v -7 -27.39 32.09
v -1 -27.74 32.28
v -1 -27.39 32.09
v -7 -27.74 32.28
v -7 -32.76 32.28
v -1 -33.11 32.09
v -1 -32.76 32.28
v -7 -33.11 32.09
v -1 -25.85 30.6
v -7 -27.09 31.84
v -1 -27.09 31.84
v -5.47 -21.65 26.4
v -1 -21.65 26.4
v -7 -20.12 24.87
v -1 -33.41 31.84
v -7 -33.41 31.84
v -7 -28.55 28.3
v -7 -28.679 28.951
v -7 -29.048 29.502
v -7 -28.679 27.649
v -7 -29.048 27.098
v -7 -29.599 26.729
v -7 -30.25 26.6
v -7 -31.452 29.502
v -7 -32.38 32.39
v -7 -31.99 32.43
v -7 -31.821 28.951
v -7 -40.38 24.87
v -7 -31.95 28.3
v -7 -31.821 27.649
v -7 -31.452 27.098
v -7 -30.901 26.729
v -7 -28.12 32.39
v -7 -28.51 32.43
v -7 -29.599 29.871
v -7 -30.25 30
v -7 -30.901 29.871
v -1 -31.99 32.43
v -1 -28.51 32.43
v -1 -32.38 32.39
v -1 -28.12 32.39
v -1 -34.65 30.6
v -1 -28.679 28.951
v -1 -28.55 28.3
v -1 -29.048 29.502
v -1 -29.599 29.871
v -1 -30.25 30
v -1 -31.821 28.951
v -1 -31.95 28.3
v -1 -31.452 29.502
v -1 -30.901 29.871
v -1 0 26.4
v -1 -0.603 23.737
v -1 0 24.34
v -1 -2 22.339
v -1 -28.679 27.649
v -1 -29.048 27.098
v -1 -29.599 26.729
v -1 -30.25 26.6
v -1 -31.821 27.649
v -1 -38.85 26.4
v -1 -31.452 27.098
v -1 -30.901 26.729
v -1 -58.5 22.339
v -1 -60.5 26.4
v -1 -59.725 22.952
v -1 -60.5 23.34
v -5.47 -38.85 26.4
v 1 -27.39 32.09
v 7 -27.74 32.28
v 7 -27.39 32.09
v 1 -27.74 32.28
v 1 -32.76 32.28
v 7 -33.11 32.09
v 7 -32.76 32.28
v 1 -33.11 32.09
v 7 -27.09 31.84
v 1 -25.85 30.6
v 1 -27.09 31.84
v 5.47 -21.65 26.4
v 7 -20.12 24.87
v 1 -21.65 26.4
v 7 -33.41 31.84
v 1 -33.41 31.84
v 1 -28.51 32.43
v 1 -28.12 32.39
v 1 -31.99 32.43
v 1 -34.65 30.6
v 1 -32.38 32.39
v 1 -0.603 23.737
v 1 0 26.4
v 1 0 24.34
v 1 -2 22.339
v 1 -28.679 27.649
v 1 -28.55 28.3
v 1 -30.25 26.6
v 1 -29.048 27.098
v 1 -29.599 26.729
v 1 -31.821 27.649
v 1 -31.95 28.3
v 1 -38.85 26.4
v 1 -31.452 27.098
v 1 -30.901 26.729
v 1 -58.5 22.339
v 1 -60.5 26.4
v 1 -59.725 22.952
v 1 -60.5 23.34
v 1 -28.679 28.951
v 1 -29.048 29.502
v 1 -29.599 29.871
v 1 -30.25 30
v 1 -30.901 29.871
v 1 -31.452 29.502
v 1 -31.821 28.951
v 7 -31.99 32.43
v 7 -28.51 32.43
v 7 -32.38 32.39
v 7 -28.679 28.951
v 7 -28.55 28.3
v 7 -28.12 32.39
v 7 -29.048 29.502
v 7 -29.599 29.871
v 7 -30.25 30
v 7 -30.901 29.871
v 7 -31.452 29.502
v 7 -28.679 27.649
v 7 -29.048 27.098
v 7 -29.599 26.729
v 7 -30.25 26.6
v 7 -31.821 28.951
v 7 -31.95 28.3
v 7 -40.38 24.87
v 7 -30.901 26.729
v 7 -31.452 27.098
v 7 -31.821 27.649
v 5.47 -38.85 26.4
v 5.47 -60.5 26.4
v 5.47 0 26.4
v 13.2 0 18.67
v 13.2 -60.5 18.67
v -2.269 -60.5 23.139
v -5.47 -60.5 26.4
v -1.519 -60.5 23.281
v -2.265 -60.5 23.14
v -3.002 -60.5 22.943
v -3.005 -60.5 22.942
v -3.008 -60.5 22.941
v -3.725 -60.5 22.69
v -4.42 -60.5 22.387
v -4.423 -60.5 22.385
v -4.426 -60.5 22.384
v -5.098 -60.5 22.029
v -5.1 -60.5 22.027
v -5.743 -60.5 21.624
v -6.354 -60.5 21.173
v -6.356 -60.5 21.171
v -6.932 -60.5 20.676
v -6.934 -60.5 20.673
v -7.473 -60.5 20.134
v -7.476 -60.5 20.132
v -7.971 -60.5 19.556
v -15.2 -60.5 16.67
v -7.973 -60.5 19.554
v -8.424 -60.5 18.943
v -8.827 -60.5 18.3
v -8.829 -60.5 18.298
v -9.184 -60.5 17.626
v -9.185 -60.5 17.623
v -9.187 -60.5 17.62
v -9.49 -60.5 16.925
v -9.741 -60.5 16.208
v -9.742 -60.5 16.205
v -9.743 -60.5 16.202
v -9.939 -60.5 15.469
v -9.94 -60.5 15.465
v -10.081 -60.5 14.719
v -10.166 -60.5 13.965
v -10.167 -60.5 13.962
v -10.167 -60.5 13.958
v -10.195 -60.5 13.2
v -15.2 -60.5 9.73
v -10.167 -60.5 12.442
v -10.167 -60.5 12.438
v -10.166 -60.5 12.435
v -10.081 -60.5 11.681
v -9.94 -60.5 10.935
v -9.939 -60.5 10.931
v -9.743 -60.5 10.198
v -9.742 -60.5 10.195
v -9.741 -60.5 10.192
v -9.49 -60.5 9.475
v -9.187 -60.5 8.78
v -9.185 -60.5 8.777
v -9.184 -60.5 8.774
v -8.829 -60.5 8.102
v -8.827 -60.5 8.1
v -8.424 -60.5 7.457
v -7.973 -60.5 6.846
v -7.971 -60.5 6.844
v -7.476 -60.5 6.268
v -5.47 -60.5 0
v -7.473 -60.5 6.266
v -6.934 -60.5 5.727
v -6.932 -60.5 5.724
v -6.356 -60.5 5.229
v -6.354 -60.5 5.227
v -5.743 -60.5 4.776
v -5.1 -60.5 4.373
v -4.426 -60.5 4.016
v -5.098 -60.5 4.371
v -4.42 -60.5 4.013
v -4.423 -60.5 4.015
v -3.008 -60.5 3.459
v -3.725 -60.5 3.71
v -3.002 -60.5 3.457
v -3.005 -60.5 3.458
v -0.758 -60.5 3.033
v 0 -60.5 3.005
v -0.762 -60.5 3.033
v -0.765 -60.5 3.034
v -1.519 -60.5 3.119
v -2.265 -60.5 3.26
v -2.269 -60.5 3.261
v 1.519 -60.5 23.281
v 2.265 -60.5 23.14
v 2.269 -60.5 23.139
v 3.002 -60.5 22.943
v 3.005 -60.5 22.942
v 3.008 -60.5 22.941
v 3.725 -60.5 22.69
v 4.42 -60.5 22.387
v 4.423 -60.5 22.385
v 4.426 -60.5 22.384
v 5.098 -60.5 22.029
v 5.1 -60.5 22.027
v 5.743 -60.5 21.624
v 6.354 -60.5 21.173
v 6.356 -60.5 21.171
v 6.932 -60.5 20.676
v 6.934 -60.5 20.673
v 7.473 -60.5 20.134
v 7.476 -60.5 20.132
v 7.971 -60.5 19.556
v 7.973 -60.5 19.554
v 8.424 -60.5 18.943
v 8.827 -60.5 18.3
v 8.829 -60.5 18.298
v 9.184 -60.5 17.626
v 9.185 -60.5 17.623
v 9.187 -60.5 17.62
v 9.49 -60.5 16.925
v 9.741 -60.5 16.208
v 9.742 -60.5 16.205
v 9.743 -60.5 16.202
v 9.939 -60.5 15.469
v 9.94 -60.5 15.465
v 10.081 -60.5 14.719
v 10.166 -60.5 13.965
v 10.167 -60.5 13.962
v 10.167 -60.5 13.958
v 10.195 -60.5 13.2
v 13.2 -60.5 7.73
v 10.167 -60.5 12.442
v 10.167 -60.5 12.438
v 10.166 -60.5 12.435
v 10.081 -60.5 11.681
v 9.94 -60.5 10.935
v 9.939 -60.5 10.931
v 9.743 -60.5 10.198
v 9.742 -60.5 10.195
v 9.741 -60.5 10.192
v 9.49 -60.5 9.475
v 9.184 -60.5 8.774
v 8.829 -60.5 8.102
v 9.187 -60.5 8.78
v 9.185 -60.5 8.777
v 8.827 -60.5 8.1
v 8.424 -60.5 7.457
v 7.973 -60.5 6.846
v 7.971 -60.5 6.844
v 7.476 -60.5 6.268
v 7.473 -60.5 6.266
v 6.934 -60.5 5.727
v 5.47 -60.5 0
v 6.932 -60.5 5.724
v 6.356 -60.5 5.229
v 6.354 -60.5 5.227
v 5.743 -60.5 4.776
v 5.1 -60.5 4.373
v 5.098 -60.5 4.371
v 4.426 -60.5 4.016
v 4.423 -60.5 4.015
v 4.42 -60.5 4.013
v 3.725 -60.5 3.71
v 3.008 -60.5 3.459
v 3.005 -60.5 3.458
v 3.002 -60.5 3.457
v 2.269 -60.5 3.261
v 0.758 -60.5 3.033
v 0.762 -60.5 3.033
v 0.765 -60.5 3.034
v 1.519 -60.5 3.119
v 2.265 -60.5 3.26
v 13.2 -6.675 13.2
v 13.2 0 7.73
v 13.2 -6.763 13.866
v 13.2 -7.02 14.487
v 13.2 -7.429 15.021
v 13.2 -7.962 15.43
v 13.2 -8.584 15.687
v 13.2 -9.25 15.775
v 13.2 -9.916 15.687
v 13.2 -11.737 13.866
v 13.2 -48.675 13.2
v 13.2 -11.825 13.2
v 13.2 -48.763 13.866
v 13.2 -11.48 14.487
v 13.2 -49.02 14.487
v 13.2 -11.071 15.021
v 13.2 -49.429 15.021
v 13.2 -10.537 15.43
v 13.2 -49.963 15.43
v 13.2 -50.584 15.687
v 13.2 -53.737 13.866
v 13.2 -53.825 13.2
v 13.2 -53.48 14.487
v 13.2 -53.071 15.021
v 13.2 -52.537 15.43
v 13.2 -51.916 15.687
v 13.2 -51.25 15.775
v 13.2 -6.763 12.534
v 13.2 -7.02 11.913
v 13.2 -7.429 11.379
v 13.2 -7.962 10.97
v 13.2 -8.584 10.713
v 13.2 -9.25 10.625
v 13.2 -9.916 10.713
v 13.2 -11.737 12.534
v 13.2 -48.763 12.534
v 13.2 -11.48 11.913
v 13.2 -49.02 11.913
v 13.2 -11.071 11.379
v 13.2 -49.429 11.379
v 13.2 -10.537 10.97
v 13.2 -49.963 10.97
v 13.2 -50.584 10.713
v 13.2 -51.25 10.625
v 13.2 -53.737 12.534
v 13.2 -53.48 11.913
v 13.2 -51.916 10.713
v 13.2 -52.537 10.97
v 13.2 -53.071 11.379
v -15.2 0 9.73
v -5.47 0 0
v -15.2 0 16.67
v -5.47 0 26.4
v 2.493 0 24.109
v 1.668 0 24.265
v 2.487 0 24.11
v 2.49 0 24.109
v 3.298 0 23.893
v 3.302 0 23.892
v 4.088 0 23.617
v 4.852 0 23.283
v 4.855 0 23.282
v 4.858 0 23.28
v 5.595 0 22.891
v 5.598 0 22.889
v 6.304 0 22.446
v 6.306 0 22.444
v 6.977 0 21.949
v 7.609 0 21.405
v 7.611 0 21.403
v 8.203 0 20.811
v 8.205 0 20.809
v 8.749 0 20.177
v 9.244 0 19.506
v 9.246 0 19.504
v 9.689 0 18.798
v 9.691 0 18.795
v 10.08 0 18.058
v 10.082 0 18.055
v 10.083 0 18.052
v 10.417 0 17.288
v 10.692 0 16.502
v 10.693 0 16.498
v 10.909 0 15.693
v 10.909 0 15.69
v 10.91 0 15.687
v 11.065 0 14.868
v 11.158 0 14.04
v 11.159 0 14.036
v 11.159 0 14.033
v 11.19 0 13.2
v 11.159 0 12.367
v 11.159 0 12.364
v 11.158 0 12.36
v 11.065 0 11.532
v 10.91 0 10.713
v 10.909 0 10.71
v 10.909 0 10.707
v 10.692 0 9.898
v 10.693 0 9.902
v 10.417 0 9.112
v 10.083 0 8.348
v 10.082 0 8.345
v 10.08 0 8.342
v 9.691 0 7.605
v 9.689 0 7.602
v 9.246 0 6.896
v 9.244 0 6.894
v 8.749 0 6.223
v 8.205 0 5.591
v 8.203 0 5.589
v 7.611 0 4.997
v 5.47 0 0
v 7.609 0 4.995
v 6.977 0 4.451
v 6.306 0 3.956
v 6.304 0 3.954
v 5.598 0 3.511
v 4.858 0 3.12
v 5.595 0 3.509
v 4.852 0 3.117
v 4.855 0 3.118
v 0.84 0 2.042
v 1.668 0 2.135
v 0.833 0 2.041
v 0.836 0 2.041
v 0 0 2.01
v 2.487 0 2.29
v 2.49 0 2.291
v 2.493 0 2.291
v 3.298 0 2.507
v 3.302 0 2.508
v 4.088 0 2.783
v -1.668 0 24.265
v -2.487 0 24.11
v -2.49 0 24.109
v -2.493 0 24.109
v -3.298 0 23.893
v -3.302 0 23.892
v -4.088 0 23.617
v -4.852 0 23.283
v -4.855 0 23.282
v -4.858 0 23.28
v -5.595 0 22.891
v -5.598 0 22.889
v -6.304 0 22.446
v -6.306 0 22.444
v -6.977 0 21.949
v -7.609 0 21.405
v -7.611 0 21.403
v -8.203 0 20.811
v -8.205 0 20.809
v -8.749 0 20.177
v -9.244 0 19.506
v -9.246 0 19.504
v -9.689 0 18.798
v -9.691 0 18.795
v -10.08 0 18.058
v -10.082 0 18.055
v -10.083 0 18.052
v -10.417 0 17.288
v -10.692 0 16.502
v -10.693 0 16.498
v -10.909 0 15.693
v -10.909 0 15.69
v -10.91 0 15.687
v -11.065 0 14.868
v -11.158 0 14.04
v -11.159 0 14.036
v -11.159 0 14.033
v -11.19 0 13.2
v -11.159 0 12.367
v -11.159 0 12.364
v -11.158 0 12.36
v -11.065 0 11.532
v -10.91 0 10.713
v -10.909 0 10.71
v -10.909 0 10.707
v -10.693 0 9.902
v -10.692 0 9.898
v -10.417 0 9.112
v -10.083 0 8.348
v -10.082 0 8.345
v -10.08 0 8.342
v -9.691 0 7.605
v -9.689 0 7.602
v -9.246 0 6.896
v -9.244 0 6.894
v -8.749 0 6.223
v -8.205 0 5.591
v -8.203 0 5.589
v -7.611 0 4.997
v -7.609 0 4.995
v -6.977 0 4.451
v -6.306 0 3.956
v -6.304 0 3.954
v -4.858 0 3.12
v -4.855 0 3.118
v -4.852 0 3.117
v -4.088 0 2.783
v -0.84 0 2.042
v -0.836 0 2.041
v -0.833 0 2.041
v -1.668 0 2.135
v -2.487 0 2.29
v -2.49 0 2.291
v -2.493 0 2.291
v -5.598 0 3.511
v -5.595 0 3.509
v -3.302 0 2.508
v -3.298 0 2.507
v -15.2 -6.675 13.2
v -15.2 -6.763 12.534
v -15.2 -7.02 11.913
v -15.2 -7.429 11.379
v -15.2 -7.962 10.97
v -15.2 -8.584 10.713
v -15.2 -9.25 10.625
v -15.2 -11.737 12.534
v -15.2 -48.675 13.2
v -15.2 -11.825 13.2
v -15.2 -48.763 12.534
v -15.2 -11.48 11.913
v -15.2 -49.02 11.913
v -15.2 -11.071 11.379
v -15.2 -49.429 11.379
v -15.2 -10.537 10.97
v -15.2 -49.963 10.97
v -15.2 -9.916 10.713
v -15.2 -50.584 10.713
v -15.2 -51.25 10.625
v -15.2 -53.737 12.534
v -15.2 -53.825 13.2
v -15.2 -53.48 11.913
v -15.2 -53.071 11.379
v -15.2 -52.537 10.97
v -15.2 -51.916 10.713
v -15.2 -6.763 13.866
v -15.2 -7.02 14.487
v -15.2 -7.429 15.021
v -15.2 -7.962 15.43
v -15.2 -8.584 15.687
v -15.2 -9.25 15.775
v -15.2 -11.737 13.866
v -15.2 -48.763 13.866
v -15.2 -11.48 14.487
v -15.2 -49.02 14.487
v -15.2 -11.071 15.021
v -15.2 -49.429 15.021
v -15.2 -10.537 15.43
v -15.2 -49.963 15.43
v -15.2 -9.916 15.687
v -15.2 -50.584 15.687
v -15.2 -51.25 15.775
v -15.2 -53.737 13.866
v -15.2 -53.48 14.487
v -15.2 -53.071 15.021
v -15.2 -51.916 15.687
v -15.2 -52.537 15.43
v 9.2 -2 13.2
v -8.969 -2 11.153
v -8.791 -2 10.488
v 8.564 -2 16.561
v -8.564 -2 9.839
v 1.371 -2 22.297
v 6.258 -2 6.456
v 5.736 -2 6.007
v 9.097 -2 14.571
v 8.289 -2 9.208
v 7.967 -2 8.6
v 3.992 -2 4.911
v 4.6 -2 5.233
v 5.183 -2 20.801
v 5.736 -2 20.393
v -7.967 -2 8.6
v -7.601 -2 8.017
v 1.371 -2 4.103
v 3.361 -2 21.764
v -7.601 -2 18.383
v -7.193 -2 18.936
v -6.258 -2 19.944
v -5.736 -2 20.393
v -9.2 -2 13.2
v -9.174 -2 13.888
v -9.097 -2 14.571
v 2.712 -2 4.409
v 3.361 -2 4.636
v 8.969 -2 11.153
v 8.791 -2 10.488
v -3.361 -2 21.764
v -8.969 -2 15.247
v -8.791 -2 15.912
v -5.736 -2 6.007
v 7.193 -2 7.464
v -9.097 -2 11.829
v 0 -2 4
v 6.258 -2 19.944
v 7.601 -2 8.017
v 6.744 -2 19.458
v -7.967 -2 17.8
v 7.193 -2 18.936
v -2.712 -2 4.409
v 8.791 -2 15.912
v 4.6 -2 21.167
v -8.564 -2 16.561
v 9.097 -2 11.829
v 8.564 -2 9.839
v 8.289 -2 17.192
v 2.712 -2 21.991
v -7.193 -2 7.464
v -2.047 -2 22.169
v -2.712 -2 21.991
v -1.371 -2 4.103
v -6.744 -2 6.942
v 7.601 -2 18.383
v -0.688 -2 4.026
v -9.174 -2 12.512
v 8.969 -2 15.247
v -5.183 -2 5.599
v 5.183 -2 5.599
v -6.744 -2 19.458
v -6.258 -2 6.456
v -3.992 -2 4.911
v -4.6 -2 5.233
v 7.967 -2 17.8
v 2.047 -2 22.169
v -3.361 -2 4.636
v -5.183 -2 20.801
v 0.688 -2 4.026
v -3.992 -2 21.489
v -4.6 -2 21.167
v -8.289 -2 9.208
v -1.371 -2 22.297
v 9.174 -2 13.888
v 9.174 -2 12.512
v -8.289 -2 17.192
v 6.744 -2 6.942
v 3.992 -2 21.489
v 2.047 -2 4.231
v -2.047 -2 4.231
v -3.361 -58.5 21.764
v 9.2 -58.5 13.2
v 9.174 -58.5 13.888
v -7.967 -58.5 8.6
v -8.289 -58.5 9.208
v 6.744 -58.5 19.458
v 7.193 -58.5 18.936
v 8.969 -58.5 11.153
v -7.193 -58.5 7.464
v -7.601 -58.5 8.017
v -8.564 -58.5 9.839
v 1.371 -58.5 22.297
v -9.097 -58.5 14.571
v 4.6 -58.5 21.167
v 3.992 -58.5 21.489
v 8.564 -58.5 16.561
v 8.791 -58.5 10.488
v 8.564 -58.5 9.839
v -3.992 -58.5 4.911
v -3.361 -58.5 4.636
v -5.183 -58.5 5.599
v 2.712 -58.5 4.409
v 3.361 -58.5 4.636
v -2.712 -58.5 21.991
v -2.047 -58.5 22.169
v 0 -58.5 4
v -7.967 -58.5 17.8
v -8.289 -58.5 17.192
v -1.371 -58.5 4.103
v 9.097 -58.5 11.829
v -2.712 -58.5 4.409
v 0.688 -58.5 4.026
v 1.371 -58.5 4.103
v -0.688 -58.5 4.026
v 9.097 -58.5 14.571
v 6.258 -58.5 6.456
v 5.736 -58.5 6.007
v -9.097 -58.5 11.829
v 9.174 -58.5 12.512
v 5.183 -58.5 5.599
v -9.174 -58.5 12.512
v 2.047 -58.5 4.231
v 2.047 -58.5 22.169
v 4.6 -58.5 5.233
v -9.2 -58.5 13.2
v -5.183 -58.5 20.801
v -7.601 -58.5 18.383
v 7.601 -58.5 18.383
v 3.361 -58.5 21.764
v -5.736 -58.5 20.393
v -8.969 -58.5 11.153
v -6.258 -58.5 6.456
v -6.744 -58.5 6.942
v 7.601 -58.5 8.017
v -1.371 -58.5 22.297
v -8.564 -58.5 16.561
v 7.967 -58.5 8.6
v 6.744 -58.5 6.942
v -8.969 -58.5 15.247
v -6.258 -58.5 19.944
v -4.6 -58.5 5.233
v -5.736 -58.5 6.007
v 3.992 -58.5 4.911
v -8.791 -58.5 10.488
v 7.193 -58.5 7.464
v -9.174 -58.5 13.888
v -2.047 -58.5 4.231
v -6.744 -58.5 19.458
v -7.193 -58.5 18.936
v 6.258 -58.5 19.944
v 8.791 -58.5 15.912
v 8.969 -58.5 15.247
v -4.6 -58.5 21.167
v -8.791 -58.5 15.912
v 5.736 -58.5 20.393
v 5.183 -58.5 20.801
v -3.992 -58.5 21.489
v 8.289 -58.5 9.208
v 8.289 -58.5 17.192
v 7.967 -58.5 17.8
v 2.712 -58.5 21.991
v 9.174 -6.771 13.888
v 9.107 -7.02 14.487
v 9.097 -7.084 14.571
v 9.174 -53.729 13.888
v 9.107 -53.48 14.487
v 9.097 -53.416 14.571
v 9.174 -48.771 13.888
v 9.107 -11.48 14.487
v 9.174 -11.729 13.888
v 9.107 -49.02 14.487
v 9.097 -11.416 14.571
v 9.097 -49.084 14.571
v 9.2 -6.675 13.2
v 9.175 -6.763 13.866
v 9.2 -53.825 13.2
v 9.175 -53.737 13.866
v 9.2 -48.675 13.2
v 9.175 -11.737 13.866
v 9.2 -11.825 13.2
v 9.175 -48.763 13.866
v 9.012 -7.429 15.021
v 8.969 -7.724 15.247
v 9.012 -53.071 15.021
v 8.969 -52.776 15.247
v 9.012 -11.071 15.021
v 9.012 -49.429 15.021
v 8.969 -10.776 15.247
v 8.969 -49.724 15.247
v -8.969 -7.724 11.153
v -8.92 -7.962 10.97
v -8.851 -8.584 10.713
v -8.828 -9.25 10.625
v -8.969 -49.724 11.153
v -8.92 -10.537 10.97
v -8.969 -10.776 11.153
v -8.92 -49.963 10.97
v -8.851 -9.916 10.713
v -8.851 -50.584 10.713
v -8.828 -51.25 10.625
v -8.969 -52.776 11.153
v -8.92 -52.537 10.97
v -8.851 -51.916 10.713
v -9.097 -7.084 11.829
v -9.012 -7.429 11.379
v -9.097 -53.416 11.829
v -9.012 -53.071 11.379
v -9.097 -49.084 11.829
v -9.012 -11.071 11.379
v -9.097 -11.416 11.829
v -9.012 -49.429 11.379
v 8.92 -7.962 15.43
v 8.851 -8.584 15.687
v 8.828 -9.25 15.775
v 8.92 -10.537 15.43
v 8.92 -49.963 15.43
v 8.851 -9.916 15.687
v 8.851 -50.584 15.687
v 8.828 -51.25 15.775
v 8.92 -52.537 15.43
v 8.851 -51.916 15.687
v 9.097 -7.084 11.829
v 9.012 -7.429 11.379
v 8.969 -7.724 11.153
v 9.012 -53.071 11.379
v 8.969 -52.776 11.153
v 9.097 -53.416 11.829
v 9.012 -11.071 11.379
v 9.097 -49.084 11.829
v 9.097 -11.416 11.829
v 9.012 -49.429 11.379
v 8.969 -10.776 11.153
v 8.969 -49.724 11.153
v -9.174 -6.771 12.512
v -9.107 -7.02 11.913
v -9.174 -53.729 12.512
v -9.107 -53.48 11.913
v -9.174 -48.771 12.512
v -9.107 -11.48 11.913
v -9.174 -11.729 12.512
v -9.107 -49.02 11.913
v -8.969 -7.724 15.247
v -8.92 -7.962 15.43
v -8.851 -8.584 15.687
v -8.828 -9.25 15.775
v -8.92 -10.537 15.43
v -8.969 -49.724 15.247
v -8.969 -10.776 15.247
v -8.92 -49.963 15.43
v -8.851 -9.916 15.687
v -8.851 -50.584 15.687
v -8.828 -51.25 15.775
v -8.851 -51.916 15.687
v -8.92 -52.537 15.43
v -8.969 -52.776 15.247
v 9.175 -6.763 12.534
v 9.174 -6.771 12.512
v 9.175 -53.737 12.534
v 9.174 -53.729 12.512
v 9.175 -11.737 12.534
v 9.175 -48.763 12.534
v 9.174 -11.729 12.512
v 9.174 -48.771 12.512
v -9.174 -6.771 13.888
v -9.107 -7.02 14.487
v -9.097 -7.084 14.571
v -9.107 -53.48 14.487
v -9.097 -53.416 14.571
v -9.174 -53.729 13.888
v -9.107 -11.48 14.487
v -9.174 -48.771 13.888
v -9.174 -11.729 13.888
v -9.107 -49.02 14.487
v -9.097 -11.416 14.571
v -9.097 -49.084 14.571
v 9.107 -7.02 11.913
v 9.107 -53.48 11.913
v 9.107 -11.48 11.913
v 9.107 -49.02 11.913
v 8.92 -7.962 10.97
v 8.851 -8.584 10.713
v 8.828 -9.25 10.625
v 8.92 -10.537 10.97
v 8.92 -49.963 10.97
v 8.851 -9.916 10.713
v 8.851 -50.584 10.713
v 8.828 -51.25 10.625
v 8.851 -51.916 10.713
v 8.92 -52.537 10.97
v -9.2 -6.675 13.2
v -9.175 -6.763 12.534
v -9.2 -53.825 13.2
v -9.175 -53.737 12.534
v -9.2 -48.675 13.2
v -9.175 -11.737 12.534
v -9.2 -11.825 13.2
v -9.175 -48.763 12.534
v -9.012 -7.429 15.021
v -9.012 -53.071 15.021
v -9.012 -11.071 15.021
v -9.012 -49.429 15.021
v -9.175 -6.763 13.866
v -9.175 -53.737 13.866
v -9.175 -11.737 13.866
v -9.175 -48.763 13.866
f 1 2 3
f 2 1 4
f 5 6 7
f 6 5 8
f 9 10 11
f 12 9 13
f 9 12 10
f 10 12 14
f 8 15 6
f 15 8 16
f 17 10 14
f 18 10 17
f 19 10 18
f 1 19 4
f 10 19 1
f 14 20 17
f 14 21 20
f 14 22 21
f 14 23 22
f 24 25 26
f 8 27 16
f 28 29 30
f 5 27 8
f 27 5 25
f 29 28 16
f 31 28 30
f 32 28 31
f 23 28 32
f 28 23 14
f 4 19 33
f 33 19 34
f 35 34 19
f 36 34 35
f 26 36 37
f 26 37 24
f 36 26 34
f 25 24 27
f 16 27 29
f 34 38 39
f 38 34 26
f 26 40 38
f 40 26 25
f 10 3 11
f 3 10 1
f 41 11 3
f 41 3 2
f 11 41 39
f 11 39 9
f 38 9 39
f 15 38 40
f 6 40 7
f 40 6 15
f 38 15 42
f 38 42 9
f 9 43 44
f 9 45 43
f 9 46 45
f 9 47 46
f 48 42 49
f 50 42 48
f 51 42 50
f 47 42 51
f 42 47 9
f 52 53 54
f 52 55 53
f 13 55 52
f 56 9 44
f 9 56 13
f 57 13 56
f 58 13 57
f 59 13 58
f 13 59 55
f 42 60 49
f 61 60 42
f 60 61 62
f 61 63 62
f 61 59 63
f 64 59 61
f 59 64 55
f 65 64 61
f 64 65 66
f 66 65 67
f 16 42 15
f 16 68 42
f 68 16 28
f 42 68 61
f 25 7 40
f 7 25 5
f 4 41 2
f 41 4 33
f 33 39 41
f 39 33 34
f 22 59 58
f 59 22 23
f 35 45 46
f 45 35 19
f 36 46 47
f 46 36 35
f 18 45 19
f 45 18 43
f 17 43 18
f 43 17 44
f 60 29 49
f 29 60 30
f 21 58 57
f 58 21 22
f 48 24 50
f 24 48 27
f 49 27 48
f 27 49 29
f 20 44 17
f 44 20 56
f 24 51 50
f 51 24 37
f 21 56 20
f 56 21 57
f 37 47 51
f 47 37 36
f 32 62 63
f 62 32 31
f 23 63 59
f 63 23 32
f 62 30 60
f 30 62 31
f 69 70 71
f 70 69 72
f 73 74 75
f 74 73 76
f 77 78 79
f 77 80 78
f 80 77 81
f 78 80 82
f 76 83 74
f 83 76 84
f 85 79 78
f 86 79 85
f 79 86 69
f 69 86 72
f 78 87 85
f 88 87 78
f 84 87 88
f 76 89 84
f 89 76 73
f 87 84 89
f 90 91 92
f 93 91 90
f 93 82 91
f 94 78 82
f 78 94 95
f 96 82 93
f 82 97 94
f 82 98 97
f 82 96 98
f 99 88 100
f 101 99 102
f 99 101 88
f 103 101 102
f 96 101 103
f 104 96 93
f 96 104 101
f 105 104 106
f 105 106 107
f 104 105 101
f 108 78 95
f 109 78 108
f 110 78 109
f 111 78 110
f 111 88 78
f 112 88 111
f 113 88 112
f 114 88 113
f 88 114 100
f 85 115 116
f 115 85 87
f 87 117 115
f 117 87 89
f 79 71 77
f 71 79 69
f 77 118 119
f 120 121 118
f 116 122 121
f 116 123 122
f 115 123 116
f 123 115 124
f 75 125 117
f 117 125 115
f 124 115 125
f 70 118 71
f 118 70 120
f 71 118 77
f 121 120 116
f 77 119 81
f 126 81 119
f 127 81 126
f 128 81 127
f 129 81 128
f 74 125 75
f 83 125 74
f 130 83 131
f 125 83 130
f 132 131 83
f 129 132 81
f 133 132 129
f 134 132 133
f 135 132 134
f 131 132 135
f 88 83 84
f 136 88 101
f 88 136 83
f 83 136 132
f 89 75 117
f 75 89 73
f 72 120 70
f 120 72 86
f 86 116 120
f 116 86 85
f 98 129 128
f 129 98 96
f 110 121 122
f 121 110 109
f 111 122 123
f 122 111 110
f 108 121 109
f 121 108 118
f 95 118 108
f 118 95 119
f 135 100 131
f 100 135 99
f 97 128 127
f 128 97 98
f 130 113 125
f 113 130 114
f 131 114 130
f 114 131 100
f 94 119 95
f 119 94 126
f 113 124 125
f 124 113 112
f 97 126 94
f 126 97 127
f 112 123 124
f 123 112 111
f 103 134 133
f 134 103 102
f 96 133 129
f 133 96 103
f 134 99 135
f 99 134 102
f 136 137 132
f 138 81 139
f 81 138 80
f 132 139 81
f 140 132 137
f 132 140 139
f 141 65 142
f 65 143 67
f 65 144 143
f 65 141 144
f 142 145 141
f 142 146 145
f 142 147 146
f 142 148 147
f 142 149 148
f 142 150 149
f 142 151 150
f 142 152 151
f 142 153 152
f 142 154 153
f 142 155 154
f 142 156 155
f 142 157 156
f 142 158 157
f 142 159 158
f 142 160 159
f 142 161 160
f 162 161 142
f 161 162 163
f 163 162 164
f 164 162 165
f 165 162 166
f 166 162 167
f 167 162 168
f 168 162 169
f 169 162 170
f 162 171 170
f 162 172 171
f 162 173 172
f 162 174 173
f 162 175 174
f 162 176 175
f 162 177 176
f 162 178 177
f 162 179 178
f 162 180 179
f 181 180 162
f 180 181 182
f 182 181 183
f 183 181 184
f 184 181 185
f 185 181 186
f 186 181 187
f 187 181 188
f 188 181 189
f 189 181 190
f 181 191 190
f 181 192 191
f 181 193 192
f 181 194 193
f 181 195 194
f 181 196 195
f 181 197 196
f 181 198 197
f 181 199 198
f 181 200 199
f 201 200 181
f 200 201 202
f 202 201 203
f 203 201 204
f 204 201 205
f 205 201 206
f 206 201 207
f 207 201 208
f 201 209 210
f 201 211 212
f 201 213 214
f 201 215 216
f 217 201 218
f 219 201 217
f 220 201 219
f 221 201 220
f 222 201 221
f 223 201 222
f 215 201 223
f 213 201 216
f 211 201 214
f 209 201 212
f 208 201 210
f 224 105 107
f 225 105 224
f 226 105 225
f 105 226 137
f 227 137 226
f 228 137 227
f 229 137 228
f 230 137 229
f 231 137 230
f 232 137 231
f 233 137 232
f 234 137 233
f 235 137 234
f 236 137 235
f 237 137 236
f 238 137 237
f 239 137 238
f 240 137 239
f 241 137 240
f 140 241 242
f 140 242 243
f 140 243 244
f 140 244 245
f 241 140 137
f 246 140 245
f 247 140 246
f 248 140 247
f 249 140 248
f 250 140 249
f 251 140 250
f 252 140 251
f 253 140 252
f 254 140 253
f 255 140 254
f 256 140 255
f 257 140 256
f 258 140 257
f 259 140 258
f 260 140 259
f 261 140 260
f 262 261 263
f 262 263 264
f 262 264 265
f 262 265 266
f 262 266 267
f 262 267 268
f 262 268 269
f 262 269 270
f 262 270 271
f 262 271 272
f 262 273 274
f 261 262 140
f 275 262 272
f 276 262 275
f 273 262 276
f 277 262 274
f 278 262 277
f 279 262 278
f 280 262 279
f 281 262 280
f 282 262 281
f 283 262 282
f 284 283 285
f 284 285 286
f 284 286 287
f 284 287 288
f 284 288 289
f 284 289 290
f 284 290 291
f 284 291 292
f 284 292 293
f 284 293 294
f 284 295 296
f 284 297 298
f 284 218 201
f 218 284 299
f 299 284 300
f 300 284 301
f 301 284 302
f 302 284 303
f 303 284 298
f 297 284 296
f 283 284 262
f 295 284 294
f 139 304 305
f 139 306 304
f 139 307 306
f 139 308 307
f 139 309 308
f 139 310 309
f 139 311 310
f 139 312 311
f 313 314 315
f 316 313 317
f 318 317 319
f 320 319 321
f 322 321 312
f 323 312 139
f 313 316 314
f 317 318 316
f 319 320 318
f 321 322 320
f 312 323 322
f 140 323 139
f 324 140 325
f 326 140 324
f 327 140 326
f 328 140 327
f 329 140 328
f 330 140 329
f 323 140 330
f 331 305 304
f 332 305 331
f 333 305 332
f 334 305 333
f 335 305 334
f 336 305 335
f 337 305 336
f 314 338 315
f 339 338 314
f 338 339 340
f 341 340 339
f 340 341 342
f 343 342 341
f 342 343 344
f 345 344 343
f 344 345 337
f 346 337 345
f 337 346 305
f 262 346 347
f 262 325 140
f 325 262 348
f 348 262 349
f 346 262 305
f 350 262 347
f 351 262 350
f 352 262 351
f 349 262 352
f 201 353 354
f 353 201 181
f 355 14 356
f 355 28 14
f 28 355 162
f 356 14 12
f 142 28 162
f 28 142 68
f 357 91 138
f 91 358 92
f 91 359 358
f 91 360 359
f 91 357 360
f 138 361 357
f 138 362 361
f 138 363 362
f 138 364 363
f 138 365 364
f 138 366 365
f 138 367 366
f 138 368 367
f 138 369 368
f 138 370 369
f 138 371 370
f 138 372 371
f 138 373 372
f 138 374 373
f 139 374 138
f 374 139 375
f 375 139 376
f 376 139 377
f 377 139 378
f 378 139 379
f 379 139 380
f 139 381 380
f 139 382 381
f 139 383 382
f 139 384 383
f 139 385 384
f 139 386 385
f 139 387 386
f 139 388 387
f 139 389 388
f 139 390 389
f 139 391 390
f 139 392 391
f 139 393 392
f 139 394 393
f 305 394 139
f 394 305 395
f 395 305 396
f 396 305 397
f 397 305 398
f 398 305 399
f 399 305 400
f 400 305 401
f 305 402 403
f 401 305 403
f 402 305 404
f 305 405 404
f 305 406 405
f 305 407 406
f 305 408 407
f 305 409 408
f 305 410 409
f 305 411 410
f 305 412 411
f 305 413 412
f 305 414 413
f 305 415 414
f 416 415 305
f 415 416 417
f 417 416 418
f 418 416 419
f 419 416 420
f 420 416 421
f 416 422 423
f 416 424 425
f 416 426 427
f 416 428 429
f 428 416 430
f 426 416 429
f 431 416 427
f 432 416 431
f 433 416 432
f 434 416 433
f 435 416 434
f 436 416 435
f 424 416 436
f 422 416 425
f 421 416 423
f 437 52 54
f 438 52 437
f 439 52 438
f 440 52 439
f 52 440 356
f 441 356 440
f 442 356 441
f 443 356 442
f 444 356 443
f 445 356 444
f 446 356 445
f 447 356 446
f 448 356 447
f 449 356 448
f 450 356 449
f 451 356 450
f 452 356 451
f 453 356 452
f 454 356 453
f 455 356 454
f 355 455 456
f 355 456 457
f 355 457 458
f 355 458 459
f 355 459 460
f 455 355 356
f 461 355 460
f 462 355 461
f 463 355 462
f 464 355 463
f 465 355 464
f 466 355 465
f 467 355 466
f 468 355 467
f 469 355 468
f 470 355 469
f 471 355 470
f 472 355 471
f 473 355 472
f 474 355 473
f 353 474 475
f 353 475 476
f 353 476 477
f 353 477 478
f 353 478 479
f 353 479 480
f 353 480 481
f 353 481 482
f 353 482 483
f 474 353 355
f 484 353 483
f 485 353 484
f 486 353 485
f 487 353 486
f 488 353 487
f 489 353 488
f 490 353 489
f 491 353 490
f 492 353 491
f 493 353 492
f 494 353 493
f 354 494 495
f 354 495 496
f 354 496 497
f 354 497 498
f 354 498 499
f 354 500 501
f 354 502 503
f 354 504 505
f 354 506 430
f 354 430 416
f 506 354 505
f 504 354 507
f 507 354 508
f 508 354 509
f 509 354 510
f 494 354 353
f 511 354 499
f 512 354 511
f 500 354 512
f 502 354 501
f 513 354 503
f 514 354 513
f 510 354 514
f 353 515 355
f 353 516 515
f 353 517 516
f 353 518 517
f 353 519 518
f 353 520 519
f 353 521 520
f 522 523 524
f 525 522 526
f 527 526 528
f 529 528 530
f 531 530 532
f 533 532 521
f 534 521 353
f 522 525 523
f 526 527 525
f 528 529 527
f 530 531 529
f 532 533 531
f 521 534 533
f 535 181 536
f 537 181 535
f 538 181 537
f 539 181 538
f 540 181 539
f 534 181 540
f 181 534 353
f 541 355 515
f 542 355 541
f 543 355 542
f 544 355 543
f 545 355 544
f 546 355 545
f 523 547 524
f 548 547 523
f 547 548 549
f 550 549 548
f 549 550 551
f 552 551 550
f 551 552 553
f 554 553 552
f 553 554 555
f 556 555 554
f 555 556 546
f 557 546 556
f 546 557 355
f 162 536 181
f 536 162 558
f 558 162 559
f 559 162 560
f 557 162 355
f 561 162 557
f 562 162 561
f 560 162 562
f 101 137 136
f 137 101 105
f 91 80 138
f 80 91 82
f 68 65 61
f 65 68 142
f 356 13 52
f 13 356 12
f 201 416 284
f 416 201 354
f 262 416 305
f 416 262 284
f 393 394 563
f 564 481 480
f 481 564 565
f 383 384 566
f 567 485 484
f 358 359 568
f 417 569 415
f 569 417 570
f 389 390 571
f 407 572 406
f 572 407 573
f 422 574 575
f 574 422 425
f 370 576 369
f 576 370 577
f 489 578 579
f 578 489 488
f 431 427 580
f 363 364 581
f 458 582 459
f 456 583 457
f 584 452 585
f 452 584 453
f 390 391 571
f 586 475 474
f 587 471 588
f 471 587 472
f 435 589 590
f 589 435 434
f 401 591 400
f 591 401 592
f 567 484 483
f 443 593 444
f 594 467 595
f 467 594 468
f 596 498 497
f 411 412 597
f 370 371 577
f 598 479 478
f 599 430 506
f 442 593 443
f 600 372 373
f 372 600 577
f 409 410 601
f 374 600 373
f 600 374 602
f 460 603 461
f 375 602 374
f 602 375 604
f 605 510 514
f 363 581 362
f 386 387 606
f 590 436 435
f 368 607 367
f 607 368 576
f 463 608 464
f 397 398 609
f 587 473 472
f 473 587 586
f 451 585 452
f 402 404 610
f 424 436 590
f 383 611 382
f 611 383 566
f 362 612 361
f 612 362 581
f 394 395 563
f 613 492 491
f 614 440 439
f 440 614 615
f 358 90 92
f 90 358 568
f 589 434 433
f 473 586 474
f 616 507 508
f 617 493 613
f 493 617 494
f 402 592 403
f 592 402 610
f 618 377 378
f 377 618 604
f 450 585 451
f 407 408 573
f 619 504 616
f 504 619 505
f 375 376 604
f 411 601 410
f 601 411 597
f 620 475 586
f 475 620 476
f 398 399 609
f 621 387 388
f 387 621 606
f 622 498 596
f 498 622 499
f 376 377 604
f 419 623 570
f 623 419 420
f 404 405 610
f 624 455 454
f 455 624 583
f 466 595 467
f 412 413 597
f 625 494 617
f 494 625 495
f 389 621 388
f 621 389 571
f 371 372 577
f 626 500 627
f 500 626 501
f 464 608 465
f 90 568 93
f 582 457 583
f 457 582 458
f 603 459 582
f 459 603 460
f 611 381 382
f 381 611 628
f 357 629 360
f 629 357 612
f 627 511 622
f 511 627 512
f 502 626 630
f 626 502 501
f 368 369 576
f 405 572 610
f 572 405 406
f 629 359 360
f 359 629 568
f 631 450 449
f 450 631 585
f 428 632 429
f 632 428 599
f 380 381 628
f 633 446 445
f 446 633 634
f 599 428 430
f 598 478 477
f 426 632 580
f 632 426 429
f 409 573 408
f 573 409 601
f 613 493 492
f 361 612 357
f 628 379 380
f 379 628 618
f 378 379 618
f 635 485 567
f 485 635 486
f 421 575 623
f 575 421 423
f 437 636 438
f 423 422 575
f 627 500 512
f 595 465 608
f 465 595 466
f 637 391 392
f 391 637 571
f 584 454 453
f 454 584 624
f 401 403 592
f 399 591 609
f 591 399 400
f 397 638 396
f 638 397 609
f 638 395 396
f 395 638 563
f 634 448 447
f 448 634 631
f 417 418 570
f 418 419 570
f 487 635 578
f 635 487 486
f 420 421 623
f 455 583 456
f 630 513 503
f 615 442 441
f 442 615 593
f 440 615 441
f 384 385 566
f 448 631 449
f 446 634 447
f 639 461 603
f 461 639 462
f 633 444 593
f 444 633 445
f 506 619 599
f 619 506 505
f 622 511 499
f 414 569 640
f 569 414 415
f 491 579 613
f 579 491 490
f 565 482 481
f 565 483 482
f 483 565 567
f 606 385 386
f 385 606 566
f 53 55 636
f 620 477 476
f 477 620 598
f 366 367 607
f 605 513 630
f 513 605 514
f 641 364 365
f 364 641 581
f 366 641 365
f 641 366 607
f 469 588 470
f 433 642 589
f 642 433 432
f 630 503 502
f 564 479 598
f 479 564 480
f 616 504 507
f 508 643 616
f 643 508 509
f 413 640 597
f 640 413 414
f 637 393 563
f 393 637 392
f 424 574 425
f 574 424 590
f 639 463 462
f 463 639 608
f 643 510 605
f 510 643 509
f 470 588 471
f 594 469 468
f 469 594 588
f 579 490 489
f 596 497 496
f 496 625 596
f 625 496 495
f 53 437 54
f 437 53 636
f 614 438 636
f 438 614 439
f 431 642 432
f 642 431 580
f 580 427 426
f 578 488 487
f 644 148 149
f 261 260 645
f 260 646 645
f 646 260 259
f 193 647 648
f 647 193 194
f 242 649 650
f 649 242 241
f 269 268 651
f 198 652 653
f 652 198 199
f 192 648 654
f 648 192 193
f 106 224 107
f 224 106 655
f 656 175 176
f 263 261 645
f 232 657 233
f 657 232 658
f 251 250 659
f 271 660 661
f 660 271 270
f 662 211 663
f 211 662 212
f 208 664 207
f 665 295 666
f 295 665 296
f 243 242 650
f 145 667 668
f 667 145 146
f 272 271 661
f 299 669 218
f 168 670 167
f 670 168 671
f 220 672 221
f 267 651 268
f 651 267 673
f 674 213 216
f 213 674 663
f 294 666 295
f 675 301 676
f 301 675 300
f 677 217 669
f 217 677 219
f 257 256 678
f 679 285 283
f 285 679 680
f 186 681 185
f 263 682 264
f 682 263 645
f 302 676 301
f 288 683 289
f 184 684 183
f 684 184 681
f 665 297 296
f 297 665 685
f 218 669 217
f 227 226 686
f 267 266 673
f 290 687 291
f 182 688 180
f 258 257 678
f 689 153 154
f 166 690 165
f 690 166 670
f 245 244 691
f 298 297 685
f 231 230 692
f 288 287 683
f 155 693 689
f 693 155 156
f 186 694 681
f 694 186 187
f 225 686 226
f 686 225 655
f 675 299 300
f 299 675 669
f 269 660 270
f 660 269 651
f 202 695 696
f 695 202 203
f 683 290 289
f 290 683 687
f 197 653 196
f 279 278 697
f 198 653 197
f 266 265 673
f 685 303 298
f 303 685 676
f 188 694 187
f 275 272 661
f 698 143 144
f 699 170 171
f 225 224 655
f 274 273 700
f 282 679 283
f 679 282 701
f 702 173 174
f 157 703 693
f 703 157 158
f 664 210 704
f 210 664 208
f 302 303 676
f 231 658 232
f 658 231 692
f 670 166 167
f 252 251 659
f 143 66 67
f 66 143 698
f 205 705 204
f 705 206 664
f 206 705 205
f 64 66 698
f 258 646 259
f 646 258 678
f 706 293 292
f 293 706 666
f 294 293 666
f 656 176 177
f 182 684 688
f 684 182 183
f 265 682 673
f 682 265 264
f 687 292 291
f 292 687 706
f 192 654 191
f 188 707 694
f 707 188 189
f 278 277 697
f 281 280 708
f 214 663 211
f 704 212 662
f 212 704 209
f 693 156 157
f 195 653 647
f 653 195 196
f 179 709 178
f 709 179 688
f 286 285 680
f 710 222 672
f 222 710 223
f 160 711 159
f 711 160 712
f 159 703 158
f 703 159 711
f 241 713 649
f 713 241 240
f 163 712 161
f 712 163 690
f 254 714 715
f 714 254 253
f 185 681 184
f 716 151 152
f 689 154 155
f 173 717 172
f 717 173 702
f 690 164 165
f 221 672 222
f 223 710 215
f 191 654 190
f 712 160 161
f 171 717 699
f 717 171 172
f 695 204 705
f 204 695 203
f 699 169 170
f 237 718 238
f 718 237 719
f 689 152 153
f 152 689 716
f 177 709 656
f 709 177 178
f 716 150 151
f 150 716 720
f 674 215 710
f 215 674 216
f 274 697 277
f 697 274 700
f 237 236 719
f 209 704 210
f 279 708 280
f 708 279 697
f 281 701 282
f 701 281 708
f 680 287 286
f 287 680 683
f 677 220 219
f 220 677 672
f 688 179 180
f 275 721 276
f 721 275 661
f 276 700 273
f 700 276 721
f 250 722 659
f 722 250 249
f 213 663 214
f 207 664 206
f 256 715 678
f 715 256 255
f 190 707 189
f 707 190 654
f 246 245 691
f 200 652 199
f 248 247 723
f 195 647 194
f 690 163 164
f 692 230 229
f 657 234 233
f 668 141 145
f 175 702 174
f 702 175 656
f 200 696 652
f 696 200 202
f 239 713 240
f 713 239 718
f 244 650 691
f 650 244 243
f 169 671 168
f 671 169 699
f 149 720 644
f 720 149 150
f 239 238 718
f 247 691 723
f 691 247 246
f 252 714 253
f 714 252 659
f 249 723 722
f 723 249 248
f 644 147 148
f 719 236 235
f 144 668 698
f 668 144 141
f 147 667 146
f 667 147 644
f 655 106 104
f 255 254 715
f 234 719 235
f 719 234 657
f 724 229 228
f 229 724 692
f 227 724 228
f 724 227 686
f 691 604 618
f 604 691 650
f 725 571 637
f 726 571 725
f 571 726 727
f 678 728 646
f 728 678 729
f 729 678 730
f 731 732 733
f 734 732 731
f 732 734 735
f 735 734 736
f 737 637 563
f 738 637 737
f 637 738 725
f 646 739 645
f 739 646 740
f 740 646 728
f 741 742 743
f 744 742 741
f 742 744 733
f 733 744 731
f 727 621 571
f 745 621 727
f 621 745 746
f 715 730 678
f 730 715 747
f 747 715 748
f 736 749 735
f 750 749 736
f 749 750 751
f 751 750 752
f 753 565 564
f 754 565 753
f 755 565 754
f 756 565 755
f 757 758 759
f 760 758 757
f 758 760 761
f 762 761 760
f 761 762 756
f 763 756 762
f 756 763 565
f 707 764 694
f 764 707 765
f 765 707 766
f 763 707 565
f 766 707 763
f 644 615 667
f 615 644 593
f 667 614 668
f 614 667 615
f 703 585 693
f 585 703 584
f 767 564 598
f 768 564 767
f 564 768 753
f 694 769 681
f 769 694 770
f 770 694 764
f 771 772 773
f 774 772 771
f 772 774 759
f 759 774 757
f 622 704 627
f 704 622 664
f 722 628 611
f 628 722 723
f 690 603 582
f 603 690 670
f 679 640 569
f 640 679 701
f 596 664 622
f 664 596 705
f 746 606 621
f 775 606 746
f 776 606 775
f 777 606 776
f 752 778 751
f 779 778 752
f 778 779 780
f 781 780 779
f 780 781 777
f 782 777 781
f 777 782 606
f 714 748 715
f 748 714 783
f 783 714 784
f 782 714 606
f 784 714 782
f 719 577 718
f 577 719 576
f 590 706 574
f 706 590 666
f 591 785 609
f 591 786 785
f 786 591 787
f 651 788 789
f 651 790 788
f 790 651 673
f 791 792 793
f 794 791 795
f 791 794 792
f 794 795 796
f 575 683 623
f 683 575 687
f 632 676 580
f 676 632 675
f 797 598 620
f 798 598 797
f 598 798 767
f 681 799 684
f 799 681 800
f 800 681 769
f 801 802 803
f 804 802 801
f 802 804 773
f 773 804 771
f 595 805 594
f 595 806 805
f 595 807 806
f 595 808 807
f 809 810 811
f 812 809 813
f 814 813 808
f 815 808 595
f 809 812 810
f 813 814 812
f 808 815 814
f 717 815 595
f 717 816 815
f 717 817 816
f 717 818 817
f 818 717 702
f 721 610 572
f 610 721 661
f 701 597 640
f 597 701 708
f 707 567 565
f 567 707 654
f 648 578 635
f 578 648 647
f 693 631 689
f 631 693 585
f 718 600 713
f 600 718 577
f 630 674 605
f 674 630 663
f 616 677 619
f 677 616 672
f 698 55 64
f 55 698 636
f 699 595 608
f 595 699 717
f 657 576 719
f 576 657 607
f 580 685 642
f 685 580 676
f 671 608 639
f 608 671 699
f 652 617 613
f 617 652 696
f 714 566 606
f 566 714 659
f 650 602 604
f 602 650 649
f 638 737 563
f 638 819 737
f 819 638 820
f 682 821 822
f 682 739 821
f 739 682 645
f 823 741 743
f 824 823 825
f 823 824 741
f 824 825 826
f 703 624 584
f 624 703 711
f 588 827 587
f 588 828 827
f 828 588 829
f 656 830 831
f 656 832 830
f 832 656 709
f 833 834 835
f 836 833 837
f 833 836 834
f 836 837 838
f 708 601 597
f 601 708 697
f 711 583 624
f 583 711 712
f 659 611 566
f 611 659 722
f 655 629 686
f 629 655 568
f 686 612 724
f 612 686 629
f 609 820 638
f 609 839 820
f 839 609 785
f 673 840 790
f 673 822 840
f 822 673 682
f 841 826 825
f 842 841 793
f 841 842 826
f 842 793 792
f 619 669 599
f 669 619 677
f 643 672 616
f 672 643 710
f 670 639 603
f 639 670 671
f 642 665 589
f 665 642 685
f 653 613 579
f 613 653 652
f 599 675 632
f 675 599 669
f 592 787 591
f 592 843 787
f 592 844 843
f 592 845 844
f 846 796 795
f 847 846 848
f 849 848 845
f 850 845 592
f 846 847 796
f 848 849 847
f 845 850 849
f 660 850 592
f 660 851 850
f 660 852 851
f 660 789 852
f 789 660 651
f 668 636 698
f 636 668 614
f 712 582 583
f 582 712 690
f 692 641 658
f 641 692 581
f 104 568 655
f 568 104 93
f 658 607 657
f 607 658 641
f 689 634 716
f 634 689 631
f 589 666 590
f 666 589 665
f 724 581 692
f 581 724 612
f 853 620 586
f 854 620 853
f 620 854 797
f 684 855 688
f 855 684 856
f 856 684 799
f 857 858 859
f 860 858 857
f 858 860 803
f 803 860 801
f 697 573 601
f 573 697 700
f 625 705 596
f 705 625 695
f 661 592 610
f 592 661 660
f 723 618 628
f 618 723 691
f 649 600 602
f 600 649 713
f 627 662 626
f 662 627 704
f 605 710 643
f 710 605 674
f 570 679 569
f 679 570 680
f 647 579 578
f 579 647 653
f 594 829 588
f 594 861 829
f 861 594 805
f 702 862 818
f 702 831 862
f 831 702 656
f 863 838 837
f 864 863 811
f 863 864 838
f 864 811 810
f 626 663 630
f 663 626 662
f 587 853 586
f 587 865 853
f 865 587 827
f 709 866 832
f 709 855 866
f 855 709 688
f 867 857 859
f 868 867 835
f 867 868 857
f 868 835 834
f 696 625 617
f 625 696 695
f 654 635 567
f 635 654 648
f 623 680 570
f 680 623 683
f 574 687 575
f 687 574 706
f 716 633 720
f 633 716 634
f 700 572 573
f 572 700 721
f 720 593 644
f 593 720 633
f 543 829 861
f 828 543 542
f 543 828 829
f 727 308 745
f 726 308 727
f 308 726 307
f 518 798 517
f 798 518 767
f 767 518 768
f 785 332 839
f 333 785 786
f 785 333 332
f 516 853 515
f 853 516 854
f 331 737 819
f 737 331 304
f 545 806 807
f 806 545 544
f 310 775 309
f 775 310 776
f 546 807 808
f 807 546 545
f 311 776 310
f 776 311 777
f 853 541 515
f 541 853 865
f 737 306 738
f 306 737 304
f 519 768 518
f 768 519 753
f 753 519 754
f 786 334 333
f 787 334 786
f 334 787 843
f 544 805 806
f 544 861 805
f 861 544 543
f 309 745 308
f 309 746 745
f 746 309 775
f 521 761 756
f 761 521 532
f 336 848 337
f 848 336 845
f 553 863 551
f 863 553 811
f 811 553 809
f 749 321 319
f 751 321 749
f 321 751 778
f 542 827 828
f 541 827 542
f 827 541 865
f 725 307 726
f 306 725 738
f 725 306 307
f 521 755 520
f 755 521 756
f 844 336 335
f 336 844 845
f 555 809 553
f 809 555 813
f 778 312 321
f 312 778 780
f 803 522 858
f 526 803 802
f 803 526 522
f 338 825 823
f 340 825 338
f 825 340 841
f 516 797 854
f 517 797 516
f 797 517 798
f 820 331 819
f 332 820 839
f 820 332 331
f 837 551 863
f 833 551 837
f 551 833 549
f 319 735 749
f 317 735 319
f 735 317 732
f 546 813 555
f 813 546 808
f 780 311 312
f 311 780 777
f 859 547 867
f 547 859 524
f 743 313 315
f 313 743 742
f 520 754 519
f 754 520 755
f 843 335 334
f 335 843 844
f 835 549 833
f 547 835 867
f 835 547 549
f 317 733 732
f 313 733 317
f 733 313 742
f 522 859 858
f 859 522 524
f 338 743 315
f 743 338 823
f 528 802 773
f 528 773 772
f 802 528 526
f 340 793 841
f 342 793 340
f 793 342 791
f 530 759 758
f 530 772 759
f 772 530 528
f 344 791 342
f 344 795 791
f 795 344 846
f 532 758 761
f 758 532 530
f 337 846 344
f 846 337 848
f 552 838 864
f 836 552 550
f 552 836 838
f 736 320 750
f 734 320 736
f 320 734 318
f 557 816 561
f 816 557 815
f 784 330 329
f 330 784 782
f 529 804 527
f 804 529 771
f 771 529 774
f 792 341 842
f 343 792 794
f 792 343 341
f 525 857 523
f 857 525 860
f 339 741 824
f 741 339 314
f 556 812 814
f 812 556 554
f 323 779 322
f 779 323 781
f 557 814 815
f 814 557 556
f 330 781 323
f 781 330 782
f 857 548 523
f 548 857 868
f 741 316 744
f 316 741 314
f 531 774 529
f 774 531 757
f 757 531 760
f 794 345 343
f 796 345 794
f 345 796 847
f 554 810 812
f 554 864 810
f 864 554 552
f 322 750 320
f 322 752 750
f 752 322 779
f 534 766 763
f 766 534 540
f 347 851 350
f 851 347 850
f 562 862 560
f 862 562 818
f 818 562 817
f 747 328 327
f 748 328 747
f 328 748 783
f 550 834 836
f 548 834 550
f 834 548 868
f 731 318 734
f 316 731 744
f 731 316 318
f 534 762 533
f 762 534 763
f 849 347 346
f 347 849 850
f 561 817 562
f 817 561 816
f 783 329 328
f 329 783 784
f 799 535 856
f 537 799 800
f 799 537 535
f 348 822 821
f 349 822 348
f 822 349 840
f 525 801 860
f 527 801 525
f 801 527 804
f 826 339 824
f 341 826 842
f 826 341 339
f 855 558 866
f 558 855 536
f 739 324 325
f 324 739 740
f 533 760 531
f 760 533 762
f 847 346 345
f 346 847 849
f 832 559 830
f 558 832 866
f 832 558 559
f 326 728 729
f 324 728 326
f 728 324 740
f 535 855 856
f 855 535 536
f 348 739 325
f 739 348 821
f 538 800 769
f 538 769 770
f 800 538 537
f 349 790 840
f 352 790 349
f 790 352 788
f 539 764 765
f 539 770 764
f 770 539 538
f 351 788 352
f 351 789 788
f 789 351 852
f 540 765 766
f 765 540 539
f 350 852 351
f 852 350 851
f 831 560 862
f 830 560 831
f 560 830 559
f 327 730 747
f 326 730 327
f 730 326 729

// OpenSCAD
//Jig to drill 2 holes in Horizontal EMT or PVC Pipe 
//Revised 11/4/2016 for 1/2" EMT, 3/4" EMT & 1/2" PVC By: David Bunch 10/17/2016
//
//For tensioning screw, I will use an M3x18mm screw
//I use arrays to determine which pipe style to create based on ET index number
ET = 0;                                     //0 = 1/2" EMT, 1 = 3/4" EMt, 2 = 1/2" PVC
A_Drill_Offset = [9.25,9,9.25];             //Starting Offset of Drill Hole
A_Drill_Spacing = [42,37,42];               //Spacing between Drill Holes
A_NutMnt_Y_Offset = [11,15,13.5];           //Offset location distance for Tensioning Block
A_PIPE_OD = [18.4,23.7,21.8];               //Diameter of Pipes
A_Jig_Offset = [13.2,15.85,14.9];           //Offset to relocate Jig to Zero Z Height

Drill_Offset = A_Drill_Offset[ET];
Drill_Spacing = A_Drill_Spacing[ET];
NutMnt_Y_Offset = A_NutMnt_Y_Offset[ET];
PIPE_OD = A_PIPE_OD[ET];
Jig_Offset = A_Jig_Offset[ET];

Ht = (Drill_Offset * 2) + Drill_Spacing;        //Height of Drill jig
Ht2 = Ht / 2;

M3 = 3.4;                       //Holding Tensioning Bolt Diameter hole
M3Nut_OD = 6.4;
M3Head_OD = 5.5;
Hole_OD = 5.15;                 //Drill Hole Diameter
M3_Res = 16;                    //Resolution of Tensioning Bolt Hole
Hole_OD_Res = 24;               //Drill Hole Resolution

Pipe_Res = (round(((PIPE_OD * 3.14)/4)/.7)*4);;

echo(Drill_Offset = Drill_Offset);
echo(Drill_Spacing = Drill_Spacing);
echo(NutMnt_Y_Offset = NutMnt_Y_Offset);
echo(PIPE_OD = PIPE_OD);
echo(Ht = Ht);
echo(Pipe_Res = Pipe_Res);

$fn=24;
module DrHole()
{
    rotate([0,90,0])
    cylinder(d = Hole_OD ,h = PIPE_OD+14, center = true, $fn = Hole_OD_Res);
}
module DrillJig_EMT12()
{
    linear_extrude(height = Ht, center = false, convexity = 10)polygon(points = 
    [[5.47,13.2],[-5.47,13.2],[-15.2,3.47],[-15.2,-3.47],[-5.47,-13.2],
    [5.47,-13.2],[13.2,-5.47],[13.2,5.47]]);
}
module DrillJig_EMT34()
{
    linear_extrude(height = Ht, center = false, convexity = 10)polygon(points = 
    [[-6.57,-15.85],[6.57,-15.85],[15.85,-6.57],[15.85,6.57],[6.57,15.85],
    [-6.57,15.85],[-17.85,4.57],[-17.85,-4.57]]);
}
module DrillJig_PVC12()
{
    linear_extrude(height = Ht, center = false, convexity = 10)polygon(points = 
    [[-16.9,-4.17],[-6.17,-14.9],[6.17,-14.9],[14.9,-6.17],[14.9,6.17],
    [6.17,14.9],[-6.17,14.9],[-16.9,4.17]]);
}
module DrillJig()
{
    if (ET == 0){ DrillJig_EMT12();}
    if (ET == 1){ DrillJig_EMT34();}
    if (ET == 2){ DrillJig_PVC12();}
}
module Pipe_Nut()
{
    translate([-1,NutMnt_Y_Offset,Ht2])
    rotate([-90,0,0])
    rotate([0,-90,0])
    difference()
    {
        linear_extrude(height = 6, center = false, convexity = 10)polygon(points = 
        [[8.23,-1.74],[8.23,1.74],[8.19,2.13],[8.08,2.51],[7.89,2.86],
        [7.64,3.16],[0,10.8],[-0.86,10.8],[-0.86,-10.8],[0,-10.8],
        [7.64,-3.16],[7.89,-2.86],[8.08,-2.51],[8.19,-2.13]]);
        translate([4.1,0,-1])
        cylinder(d=M3,h=8,$fn=M3_Res);
    }
}

module M3_Nut()
{
    color("red",.5)
    translate([-1,NutMnt_Y_Offset,Ht2])
    rotate([-90,0,0])
    rotate([0,-90,0])
    translate([4.1,0,6])
    difference()
    {
        rotate([0,0,30])
        cylinder(d=M3Nut_OD,h=4,$fn=6);
        translate([0,0,-1])
        cylinder(d=M3,h=6,$fn=M3_Res);
    }
}
module Pipe_NutsSide()
{
    Pipe_Nut();
    translate([8,0,0])
    Pipe_Nut();
    %M3_Nut();
    color("red",.5)
    translate([16.5,NutMnt_Y_Offset,Ht2])
    rotate([-90,0,0])
    rotate([0,-90,0])
    translate([4.1,0,6])
    %cylinder(d=M3Head_OD,h=3.5,$fn=24);
}
module PipeSlot()
{
    translate([-1,-1,-1])
    cube([2,PIPE_OD,Ht+20]);
}
module Pipe()
{
    translate([0,0,-1])
    cylinder(d=PIPE_OD,h=Ht + 2,$fn=Pipe_Res);
}
module PipeTaper()
{
    translate([0,0,-.01])
    cylinder(d1=PIPE_OD+4,d2=PIPE_OD,h=2.01,$fn=Pipe_Res);     //Chamfer bottom opening
    translate([0,0,Ht-2])
    cylinder(d1=PIPE_OD,d2=PIPE_OD+2,h=2.01,$fn=Pipe_Res);     //Chamfer Top Pipe opening
}
module DrawFinal()
{
    difference()
    {
        union()
        {
            DrillJig();         //Main part for the Drill Jig
            Pipe_NutsSide();    //Add the tightening screw plate to hole pipe in jig
        }
        Pipe();                 //Cut the Pipe opening
        PipeTaper();            //Taper Pipe opening

        PipeSlot();             //Cut 2mm Pipe tensioning Slot
        translate([0,0,Drill_Offset])
        DrHole();               //1st drill jig hole for drilling thru pipe
        translate([0,0,Drill_Offset + Drill_Spacing])
        DrHole();               //2nd drill jig hole for drilling thru pipe
    }
}
translate([0,0,Jig_Offset])     //Move up to build plate
rotate([90,0,0])                //Rotate part to print on its side
DrawFinal();
